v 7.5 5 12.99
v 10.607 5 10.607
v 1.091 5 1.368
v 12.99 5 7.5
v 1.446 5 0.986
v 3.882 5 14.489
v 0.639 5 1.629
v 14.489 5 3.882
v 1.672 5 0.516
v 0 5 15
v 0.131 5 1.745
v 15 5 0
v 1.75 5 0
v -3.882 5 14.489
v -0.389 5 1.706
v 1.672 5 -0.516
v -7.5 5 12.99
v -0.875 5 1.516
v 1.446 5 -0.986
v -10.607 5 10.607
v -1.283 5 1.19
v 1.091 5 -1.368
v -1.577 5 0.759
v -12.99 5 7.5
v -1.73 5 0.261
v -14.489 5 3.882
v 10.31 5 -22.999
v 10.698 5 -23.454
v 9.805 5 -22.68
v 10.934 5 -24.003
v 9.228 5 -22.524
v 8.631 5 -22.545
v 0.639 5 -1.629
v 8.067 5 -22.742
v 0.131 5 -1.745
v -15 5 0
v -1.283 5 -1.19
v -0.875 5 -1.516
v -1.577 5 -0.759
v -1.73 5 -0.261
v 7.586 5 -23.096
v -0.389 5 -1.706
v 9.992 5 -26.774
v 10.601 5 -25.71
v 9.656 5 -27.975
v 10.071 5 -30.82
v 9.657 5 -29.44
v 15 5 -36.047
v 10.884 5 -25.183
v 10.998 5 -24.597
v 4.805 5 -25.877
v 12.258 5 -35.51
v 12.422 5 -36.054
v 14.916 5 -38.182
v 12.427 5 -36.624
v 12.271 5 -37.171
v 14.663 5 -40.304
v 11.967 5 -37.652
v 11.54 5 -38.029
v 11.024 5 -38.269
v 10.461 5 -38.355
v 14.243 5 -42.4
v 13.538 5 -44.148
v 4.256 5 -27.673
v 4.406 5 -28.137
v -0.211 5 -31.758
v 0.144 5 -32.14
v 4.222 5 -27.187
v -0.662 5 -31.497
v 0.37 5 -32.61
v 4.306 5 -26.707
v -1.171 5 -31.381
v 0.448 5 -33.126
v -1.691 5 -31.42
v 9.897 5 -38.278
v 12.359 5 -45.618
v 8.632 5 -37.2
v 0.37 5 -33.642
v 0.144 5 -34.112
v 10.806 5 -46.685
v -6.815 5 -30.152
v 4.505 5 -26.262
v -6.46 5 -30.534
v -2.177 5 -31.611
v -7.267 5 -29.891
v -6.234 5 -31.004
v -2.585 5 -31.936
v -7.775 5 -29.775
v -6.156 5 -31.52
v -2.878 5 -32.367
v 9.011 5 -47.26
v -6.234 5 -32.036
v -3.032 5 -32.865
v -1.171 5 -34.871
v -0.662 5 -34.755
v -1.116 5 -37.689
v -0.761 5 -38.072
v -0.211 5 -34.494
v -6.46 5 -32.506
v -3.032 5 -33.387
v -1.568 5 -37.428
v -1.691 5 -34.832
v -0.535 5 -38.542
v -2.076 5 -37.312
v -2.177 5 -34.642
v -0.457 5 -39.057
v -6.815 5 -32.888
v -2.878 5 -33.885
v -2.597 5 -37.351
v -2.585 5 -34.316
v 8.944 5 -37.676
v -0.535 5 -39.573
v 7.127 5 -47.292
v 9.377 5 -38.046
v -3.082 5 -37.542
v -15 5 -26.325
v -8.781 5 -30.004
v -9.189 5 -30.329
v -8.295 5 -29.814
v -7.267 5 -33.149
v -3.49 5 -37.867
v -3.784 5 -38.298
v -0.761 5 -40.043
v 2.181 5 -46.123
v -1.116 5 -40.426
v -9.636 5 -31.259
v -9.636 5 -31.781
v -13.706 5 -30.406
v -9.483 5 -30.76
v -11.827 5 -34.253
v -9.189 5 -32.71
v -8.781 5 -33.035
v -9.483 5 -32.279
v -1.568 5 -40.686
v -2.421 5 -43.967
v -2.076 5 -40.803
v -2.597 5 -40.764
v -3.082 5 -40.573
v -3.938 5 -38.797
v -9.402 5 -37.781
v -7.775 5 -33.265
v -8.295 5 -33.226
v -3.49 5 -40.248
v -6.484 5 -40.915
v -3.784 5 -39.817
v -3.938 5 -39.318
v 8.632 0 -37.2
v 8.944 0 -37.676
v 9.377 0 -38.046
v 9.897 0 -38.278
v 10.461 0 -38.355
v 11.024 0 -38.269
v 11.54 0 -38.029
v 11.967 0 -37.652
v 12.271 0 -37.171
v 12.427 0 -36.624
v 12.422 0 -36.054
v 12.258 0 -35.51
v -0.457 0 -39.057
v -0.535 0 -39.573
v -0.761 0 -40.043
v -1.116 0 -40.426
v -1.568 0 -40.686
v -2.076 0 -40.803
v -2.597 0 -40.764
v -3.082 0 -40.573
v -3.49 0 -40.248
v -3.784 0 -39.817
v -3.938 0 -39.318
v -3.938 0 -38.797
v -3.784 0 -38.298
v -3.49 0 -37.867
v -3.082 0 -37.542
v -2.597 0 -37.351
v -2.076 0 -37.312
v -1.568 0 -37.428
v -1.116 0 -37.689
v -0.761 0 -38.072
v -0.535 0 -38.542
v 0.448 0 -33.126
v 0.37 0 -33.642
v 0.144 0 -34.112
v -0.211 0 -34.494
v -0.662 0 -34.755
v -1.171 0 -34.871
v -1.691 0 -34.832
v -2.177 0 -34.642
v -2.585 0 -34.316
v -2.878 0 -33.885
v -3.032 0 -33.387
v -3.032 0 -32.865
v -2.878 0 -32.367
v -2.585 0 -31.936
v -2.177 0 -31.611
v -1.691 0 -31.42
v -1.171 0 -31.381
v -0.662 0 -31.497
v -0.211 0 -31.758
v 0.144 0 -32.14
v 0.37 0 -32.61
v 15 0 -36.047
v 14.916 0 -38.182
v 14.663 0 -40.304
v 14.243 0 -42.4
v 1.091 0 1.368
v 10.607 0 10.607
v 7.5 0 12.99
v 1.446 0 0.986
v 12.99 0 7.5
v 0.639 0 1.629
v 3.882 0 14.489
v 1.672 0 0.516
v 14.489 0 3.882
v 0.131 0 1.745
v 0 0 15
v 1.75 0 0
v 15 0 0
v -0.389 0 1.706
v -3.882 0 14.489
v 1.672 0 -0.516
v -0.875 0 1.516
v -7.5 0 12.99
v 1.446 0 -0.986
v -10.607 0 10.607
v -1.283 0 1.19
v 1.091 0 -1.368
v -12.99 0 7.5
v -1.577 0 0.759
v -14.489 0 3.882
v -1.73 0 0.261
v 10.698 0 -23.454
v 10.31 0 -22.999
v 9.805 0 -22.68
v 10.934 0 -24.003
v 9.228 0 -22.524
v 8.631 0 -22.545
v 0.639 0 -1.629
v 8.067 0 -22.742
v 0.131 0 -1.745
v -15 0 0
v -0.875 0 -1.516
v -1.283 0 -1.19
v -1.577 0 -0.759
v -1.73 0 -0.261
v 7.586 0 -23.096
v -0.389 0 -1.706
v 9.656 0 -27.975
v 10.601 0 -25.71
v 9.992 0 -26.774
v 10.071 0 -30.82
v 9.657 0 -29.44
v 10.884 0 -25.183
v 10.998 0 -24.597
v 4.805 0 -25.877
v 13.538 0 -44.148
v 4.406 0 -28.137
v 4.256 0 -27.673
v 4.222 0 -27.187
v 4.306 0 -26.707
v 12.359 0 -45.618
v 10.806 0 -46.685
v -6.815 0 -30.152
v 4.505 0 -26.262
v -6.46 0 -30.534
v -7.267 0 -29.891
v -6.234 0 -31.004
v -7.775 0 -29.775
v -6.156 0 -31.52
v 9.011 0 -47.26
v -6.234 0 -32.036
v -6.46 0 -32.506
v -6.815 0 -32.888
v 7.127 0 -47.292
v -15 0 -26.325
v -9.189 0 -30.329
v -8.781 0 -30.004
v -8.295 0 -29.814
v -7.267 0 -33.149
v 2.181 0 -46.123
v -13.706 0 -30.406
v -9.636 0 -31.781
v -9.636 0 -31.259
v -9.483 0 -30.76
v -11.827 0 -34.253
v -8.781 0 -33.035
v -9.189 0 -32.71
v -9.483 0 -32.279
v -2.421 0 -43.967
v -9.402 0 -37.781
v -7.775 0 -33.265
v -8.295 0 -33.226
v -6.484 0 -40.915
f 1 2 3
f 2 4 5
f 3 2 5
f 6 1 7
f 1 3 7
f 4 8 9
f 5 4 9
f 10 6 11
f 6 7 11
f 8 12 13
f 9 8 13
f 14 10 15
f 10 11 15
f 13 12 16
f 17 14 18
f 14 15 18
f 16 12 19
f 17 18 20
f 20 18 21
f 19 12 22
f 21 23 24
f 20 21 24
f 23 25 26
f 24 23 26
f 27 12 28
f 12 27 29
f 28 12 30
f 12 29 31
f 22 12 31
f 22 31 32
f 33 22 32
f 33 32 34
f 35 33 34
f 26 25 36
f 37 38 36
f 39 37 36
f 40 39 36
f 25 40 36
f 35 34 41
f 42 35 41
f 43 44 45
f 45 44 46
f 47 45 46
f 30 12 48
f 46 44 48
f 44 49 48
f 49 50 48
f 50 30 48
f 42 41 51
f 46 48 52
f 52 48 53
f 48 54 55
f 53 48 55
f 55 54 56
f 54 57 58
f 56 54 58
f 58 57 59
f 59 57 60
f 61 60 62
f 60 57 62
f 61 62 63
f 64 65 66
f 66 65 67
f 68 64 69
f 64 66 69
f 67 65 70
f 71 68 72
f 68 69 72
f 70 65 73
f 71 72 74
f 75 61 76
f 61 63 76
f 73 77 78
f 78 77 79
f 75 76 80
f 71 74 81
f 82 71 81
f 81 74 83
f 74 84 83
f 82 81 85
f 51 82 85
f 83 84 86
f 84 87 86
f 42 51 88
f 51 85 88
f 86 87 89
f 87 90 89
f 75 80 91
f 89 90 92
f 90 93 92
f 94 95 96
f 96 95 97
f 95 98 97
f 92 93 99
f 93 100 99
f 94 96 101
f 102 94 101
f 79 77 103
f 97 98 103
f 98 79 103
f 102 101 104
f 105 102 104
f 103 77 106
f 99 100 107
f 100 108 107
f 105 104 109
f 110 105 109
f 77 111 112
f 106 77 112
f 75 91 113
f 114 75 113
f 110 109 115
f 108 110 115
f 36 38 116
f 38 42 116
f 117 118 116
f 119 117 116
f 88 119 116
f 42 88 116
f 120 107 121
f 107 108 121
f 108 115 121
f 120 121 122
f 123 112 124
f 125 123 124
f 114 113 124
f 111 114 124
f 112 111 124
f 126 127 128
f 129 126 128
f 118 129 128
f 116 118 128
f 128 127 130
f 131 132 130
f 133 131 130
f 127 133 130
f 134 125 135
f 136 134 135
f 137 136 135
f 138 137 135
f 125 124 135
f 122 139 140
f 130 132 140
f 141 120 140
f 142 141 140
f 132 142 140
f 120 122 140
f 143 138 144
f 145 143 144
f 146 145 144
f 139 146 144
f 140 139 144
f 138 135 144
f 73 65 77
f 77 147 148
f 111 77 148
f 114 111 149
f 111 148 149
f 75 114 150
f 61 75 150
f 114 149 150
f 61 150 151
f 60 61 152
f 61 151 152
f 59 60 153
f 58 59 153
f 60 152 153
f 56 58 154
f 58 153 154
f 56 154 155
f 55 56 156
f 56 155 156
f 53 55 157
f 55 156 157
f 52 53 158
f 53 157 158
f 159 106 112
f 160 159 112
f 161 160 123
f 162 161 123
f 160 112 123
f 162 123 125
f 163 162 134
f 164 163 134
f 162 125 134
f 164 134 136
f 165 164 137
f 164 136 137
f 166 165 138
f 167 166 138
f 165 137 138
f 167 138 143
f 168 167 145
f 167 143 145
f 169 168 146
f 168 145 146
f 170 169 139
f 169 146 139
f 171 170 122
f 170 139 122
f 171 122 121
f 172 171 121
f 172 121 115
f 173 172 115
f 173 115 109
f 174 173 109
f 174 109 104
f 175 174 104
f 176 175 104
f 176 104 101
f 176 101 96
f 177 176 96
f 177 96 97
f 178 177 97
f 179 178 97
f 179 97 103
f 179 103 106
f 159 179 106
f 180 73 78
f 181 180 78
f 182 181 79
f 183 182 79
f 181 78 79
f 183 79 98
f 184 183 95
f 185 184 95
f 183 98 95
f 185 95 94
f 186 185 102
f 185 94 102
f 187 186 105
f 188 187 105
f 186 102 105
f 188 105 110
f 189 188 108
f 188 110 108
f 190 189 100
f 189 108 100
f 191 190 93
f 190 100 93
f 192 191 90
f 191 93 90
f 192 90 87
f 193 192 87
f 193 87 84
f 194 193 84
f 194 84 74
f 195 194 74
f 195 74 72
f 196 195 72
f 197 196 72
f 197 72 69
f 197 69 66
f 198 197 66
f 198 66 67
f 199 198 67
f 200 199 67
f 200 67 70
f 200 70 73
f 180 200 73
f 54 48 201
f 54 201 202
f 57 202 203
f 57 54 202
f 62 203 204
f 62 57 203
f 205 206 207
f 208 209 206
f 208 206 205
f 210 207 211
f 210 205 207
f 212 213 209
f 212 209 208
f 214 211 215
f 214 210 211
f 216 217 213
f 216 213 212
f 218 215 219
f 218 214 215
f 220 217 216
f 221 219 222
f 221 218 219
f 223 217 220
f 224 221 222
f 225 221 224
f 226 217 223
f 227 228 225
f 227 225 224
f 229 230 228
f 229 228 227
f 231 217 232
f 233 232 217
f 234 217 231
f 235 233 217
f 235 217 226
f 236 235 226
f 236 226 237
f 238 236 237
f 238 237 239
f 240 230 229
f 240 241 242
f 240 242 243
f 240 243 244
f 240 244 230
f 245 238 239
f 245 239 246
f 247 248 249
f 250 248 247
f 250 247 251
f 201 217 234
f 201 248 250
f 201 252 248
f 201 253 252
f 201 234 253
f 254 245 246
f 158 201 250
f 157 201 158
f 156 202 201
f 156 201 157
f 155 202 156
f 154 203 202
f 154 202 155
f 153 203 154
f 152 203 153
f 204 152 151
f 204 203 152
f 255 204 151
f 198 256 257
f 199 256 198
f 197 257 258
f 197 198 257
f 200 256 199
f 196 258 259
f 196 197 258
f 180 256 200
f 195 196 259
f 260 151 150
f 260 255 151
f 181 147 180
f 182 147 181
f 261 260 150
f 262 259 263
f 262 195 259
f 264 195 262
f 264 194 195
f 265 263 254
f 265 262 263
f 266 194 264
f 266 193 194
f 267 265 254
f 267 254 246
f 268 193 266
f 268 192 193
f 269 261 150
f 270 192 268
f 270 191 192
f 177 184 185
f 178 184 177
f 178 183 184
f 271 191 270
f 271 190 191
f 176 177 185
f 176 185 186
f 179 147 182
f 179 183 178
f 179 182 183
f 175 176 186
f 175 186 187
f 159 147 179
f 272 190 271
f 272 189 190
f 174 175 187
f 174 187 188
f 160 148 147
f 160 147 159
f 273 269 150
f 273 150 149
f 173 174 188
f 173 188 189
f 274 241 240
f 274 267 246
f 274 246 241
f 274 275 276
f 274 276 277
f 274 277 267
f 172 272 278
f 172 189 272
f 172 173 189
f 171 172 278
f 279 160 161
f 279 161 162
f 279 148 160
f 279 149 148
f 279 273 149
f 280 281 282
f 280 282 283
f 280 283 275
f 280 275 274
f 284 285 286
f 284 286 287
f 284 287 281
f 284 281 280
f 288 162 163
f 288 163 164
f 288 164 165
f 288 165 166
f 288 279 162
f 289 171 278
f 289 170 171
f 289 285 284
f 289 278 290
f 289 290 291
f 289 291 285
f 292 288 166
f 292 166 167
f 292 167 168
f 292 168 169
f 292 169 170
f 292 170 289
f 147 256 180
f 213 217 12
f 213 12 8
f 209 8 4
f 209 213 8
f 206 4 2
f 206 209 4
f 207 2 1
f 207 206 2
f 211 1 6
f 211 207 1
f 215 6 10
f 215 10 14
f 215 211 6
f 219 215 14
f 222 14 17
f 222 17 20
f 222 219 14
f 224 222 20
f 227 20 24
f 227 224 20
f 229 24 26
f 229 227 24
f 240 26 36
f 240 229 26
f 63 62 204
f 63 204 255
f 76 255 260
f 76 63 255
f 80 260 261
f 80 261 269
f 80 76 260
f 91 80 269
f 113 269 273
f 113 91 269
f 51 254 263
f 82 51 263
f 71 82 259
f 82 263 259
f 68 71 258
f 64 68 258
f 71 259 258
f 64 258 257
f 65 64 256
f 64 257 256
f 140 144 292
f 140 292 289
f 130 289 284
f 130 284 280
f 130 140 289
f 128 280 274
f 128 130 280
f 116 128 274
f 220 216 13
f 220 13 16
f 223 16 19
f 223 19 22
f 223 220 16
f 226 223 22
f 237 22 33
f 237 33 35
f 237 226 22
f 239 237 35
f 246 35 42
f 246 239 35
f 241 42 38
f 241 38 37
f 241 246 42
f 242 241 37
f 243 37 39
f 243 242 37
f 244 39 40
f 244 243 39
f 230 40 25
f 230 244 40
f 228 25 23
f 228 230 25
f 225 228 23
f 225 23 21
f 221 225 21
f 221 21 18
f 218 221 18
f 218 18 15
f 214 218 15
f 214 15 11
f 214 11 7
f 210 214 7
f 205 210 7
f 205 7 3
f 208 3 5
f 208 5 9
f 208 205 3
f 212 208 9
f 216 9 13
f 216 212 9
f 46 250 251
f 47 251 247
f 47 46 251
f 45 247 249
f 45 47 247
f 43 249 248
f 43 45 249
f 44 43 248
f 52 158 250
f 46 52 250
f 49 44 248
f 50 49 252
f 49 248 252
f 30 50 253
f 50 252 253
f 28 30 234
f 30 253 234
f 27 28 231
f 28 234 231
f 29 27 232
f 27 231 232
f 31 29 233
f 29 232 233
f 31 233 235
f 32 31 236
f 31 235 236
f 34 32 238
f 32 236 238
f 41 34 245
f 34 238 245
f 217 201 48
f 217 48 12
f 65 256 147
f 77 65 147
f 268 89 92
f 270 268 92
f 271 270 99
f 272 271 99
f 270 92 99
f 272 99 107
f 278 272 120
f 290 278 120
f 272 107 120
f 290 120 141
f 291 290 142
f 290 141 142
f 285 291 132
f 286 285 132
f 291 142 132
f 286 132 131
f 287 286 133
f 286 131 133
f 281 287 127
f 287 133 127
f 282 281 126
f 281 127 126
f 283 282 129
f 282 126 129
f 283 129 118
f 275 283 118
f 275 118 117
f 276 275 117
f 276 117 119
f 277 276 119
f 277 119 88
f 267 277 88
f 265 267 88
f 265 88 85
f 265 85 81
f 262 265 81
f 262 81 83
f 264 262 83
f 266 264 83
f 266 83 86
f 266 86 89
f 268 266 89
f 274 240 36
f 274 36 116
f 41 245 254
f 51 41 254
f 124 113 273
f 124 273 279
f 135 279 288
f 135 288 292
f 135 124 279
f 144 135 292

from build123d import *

# Parameters (mm, degrees)
SKETCH1_R           = 1.75
BOSS_EXTRUDE1_DEPTH = 5
FILLET1_R           = 5
CUT_EXTRUDE1_DEPTH  = 10
SKETCH3_R           = 1.75
CUT_EXTRUDE2_DEPTH  = 10


with BuildPart() as part:
    # Sketch1 → Boss-Extrude1 (new body)
    with BuildSketch(Plane(origin=(0, 0, 0), x_dir=(1, 0, 0), z_dir=(0, 1, 0))):
        with BuildLine():
            Line((-15, 0), (-15, 50))
            ThreePointArc((-15, 50), (0, 65), (15, 50))
            Line((15, 50), (15, 0))
            ThreePointArc((15, 0), (0, -15), (-15, 0))
        make_face()
        Circle(SKETCH1_R, mode=Mode.SUBTRACT)
        with BuildLine():
            Line((12.25773045, 35.509501863), (8.623388818, 27.715631082))
            Line((8.623388818, 27.715631082), (10.414213562, 25.924806337))
            ThreePointArc((10.414213562, 25.924806337), (10.414213562, 23.096379213), (7.585786438, 23.096379213))
            Line((7.585786438, 23.096379213), (4.804718696, 25.877446954))
            ThreePointArc((4.804718696, 25.877446954), (4.249316753, 26.944364161), (4.406316685, 28.13689704))
            Line((4.406316685, 28.13689704), (8.632499302, 37.19997491))
            ThreePointArc((8.632499302, 37.19997491), (11.2903514, 38.167353961), (12.25773045, 35.509501863))
        make_face(mode=Mode.SUBTRACT)
    extrude(amount=BOSS_EXTRUDE1_DEPTH)

    # Fillet1
    fillet1_edges = [part.edges().sort_by_distance(p)[0] for p in [
        (8.623388818, 2.5, -27.715631082),
    ]]
    fillet(fillet1_edges, radius=FILLET1_R)

    # Sketch2 → Cut-Extrude1 (cut)
    with BuildSketch(Plane(origin=(0, 5, 0), x_dir=(1, 0, 0), z_dir=(0, 1, 0))):
        with BuildLine():
            Line((-15, 26.324644949), (-40.925594741, 69.238213195))
            Line((-40.925594741, 69.238213195), (-58.771967888, 111.080687023))
            Line((-58.771967888, 111.080687023), (39.28439299, 102.825794629))
            Line((39.28439299, 102.825794629), (15, 36.046990739))
            ThreePointArc((15, 36.046990739), (14.81014445, 39.245839168), (14.243243524, 42.399773179))
            ThreePointArc((14.243243524, 42.399773179), (11.621838426, 46.208407589), (7.127072402, 47.292169164))
            ThreePointArc((7.127072402, 47.292169164), (-0.175202385, 45.163669538), (-6.484026655, 40.9148504))
            ThreePointArc((-6.484026655, 40.9148504), (-11.826766868, 34.252893813), (-15, 26.324644949))
        make_face()
    extrude(amount=-CUT_EXTRUDE1_DEPTH, mode=Mode.SUBTRACT)

    # Sketch3 → Cut-Extrude2 (cut)
    with BuildSketch(Plane(origin=(0, 5, 0), x_dir=(1, 0, 0), z_dir=(0, 1, 0))):
        with Locations((-1.301778952, 33.126107378)):
            Circle(SKETCH3_R)
        with Locations((-2.207127715, 39.057409395)):
            Circle(SKETCH3_R)
        with Locations((-7.905919506, 31.519764857)):
            Circle(SKETCH3_R)
    extrude(amount=-CUT_EXTRUDE2_DEPTH, mode=Mode.SUBTRACT)


solid = part.part
